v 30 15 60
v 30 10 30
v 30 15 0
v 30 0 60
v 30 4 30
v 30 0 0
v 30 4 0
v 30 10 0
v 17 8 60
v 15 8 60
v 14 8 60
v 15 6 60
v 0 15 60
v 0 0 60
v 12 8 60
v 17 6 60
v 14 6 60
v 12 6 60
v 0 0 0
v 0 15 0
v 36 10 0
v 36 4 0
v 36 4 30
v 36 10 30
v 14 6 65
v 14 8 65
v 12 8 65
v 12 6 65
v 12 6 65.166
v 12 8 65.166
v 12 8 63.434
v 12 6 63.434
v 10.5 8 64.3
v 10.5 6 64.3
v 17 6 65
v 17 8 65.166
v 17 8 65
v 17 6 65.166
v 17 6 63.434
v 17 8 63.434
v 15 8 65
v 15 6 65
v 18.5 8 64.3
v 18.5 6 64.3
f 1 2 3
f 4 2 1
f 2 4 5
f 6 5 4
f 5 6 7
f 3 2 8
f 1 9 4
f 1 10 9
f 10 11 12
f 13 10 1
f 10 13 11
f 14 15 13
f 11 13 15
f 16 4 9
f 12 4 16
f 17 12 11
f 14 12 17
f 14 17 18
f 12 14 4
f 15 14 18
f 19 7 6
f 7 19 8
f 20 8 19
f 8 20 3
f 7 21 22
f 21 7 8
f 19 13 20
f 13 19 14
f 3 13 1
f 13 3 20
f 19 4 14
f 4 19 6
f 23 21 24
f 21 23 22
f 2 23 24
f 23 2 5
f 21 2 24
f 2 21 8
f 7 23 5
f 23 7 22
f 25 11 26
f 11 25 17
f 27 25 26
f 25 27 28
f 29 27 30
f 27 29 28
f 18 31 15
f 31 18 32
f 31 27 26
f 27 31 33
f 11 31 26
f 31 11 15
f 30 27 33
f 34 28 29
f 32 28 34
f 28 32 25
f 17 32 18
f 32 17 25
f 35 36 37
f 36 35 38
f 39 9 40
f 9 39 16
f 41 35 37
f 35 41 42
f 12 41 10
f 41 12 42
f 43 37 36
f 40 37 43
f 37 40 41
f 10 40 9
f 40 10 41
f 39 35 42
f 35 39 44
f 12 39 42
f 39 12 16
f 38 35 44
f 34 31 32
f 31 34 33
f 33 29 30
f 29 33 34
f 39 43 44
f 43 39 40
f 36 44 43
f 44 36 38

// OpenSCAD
cube([30,15,60]);
translate([30,4,0])
cube([6,6,30]);
translate([12,6,60])
cube([2,2,5]);
translate([15,6,60])
cube([2,2,5]);

translate([11.5,8,64.3])
rotate([90,60,0])
cylinder(h=2,d=2,$fn=3);

translate([17.5,8,64.3])
rotate([90,0,0])
cylinder(h=2,d=2,$fn=3);
